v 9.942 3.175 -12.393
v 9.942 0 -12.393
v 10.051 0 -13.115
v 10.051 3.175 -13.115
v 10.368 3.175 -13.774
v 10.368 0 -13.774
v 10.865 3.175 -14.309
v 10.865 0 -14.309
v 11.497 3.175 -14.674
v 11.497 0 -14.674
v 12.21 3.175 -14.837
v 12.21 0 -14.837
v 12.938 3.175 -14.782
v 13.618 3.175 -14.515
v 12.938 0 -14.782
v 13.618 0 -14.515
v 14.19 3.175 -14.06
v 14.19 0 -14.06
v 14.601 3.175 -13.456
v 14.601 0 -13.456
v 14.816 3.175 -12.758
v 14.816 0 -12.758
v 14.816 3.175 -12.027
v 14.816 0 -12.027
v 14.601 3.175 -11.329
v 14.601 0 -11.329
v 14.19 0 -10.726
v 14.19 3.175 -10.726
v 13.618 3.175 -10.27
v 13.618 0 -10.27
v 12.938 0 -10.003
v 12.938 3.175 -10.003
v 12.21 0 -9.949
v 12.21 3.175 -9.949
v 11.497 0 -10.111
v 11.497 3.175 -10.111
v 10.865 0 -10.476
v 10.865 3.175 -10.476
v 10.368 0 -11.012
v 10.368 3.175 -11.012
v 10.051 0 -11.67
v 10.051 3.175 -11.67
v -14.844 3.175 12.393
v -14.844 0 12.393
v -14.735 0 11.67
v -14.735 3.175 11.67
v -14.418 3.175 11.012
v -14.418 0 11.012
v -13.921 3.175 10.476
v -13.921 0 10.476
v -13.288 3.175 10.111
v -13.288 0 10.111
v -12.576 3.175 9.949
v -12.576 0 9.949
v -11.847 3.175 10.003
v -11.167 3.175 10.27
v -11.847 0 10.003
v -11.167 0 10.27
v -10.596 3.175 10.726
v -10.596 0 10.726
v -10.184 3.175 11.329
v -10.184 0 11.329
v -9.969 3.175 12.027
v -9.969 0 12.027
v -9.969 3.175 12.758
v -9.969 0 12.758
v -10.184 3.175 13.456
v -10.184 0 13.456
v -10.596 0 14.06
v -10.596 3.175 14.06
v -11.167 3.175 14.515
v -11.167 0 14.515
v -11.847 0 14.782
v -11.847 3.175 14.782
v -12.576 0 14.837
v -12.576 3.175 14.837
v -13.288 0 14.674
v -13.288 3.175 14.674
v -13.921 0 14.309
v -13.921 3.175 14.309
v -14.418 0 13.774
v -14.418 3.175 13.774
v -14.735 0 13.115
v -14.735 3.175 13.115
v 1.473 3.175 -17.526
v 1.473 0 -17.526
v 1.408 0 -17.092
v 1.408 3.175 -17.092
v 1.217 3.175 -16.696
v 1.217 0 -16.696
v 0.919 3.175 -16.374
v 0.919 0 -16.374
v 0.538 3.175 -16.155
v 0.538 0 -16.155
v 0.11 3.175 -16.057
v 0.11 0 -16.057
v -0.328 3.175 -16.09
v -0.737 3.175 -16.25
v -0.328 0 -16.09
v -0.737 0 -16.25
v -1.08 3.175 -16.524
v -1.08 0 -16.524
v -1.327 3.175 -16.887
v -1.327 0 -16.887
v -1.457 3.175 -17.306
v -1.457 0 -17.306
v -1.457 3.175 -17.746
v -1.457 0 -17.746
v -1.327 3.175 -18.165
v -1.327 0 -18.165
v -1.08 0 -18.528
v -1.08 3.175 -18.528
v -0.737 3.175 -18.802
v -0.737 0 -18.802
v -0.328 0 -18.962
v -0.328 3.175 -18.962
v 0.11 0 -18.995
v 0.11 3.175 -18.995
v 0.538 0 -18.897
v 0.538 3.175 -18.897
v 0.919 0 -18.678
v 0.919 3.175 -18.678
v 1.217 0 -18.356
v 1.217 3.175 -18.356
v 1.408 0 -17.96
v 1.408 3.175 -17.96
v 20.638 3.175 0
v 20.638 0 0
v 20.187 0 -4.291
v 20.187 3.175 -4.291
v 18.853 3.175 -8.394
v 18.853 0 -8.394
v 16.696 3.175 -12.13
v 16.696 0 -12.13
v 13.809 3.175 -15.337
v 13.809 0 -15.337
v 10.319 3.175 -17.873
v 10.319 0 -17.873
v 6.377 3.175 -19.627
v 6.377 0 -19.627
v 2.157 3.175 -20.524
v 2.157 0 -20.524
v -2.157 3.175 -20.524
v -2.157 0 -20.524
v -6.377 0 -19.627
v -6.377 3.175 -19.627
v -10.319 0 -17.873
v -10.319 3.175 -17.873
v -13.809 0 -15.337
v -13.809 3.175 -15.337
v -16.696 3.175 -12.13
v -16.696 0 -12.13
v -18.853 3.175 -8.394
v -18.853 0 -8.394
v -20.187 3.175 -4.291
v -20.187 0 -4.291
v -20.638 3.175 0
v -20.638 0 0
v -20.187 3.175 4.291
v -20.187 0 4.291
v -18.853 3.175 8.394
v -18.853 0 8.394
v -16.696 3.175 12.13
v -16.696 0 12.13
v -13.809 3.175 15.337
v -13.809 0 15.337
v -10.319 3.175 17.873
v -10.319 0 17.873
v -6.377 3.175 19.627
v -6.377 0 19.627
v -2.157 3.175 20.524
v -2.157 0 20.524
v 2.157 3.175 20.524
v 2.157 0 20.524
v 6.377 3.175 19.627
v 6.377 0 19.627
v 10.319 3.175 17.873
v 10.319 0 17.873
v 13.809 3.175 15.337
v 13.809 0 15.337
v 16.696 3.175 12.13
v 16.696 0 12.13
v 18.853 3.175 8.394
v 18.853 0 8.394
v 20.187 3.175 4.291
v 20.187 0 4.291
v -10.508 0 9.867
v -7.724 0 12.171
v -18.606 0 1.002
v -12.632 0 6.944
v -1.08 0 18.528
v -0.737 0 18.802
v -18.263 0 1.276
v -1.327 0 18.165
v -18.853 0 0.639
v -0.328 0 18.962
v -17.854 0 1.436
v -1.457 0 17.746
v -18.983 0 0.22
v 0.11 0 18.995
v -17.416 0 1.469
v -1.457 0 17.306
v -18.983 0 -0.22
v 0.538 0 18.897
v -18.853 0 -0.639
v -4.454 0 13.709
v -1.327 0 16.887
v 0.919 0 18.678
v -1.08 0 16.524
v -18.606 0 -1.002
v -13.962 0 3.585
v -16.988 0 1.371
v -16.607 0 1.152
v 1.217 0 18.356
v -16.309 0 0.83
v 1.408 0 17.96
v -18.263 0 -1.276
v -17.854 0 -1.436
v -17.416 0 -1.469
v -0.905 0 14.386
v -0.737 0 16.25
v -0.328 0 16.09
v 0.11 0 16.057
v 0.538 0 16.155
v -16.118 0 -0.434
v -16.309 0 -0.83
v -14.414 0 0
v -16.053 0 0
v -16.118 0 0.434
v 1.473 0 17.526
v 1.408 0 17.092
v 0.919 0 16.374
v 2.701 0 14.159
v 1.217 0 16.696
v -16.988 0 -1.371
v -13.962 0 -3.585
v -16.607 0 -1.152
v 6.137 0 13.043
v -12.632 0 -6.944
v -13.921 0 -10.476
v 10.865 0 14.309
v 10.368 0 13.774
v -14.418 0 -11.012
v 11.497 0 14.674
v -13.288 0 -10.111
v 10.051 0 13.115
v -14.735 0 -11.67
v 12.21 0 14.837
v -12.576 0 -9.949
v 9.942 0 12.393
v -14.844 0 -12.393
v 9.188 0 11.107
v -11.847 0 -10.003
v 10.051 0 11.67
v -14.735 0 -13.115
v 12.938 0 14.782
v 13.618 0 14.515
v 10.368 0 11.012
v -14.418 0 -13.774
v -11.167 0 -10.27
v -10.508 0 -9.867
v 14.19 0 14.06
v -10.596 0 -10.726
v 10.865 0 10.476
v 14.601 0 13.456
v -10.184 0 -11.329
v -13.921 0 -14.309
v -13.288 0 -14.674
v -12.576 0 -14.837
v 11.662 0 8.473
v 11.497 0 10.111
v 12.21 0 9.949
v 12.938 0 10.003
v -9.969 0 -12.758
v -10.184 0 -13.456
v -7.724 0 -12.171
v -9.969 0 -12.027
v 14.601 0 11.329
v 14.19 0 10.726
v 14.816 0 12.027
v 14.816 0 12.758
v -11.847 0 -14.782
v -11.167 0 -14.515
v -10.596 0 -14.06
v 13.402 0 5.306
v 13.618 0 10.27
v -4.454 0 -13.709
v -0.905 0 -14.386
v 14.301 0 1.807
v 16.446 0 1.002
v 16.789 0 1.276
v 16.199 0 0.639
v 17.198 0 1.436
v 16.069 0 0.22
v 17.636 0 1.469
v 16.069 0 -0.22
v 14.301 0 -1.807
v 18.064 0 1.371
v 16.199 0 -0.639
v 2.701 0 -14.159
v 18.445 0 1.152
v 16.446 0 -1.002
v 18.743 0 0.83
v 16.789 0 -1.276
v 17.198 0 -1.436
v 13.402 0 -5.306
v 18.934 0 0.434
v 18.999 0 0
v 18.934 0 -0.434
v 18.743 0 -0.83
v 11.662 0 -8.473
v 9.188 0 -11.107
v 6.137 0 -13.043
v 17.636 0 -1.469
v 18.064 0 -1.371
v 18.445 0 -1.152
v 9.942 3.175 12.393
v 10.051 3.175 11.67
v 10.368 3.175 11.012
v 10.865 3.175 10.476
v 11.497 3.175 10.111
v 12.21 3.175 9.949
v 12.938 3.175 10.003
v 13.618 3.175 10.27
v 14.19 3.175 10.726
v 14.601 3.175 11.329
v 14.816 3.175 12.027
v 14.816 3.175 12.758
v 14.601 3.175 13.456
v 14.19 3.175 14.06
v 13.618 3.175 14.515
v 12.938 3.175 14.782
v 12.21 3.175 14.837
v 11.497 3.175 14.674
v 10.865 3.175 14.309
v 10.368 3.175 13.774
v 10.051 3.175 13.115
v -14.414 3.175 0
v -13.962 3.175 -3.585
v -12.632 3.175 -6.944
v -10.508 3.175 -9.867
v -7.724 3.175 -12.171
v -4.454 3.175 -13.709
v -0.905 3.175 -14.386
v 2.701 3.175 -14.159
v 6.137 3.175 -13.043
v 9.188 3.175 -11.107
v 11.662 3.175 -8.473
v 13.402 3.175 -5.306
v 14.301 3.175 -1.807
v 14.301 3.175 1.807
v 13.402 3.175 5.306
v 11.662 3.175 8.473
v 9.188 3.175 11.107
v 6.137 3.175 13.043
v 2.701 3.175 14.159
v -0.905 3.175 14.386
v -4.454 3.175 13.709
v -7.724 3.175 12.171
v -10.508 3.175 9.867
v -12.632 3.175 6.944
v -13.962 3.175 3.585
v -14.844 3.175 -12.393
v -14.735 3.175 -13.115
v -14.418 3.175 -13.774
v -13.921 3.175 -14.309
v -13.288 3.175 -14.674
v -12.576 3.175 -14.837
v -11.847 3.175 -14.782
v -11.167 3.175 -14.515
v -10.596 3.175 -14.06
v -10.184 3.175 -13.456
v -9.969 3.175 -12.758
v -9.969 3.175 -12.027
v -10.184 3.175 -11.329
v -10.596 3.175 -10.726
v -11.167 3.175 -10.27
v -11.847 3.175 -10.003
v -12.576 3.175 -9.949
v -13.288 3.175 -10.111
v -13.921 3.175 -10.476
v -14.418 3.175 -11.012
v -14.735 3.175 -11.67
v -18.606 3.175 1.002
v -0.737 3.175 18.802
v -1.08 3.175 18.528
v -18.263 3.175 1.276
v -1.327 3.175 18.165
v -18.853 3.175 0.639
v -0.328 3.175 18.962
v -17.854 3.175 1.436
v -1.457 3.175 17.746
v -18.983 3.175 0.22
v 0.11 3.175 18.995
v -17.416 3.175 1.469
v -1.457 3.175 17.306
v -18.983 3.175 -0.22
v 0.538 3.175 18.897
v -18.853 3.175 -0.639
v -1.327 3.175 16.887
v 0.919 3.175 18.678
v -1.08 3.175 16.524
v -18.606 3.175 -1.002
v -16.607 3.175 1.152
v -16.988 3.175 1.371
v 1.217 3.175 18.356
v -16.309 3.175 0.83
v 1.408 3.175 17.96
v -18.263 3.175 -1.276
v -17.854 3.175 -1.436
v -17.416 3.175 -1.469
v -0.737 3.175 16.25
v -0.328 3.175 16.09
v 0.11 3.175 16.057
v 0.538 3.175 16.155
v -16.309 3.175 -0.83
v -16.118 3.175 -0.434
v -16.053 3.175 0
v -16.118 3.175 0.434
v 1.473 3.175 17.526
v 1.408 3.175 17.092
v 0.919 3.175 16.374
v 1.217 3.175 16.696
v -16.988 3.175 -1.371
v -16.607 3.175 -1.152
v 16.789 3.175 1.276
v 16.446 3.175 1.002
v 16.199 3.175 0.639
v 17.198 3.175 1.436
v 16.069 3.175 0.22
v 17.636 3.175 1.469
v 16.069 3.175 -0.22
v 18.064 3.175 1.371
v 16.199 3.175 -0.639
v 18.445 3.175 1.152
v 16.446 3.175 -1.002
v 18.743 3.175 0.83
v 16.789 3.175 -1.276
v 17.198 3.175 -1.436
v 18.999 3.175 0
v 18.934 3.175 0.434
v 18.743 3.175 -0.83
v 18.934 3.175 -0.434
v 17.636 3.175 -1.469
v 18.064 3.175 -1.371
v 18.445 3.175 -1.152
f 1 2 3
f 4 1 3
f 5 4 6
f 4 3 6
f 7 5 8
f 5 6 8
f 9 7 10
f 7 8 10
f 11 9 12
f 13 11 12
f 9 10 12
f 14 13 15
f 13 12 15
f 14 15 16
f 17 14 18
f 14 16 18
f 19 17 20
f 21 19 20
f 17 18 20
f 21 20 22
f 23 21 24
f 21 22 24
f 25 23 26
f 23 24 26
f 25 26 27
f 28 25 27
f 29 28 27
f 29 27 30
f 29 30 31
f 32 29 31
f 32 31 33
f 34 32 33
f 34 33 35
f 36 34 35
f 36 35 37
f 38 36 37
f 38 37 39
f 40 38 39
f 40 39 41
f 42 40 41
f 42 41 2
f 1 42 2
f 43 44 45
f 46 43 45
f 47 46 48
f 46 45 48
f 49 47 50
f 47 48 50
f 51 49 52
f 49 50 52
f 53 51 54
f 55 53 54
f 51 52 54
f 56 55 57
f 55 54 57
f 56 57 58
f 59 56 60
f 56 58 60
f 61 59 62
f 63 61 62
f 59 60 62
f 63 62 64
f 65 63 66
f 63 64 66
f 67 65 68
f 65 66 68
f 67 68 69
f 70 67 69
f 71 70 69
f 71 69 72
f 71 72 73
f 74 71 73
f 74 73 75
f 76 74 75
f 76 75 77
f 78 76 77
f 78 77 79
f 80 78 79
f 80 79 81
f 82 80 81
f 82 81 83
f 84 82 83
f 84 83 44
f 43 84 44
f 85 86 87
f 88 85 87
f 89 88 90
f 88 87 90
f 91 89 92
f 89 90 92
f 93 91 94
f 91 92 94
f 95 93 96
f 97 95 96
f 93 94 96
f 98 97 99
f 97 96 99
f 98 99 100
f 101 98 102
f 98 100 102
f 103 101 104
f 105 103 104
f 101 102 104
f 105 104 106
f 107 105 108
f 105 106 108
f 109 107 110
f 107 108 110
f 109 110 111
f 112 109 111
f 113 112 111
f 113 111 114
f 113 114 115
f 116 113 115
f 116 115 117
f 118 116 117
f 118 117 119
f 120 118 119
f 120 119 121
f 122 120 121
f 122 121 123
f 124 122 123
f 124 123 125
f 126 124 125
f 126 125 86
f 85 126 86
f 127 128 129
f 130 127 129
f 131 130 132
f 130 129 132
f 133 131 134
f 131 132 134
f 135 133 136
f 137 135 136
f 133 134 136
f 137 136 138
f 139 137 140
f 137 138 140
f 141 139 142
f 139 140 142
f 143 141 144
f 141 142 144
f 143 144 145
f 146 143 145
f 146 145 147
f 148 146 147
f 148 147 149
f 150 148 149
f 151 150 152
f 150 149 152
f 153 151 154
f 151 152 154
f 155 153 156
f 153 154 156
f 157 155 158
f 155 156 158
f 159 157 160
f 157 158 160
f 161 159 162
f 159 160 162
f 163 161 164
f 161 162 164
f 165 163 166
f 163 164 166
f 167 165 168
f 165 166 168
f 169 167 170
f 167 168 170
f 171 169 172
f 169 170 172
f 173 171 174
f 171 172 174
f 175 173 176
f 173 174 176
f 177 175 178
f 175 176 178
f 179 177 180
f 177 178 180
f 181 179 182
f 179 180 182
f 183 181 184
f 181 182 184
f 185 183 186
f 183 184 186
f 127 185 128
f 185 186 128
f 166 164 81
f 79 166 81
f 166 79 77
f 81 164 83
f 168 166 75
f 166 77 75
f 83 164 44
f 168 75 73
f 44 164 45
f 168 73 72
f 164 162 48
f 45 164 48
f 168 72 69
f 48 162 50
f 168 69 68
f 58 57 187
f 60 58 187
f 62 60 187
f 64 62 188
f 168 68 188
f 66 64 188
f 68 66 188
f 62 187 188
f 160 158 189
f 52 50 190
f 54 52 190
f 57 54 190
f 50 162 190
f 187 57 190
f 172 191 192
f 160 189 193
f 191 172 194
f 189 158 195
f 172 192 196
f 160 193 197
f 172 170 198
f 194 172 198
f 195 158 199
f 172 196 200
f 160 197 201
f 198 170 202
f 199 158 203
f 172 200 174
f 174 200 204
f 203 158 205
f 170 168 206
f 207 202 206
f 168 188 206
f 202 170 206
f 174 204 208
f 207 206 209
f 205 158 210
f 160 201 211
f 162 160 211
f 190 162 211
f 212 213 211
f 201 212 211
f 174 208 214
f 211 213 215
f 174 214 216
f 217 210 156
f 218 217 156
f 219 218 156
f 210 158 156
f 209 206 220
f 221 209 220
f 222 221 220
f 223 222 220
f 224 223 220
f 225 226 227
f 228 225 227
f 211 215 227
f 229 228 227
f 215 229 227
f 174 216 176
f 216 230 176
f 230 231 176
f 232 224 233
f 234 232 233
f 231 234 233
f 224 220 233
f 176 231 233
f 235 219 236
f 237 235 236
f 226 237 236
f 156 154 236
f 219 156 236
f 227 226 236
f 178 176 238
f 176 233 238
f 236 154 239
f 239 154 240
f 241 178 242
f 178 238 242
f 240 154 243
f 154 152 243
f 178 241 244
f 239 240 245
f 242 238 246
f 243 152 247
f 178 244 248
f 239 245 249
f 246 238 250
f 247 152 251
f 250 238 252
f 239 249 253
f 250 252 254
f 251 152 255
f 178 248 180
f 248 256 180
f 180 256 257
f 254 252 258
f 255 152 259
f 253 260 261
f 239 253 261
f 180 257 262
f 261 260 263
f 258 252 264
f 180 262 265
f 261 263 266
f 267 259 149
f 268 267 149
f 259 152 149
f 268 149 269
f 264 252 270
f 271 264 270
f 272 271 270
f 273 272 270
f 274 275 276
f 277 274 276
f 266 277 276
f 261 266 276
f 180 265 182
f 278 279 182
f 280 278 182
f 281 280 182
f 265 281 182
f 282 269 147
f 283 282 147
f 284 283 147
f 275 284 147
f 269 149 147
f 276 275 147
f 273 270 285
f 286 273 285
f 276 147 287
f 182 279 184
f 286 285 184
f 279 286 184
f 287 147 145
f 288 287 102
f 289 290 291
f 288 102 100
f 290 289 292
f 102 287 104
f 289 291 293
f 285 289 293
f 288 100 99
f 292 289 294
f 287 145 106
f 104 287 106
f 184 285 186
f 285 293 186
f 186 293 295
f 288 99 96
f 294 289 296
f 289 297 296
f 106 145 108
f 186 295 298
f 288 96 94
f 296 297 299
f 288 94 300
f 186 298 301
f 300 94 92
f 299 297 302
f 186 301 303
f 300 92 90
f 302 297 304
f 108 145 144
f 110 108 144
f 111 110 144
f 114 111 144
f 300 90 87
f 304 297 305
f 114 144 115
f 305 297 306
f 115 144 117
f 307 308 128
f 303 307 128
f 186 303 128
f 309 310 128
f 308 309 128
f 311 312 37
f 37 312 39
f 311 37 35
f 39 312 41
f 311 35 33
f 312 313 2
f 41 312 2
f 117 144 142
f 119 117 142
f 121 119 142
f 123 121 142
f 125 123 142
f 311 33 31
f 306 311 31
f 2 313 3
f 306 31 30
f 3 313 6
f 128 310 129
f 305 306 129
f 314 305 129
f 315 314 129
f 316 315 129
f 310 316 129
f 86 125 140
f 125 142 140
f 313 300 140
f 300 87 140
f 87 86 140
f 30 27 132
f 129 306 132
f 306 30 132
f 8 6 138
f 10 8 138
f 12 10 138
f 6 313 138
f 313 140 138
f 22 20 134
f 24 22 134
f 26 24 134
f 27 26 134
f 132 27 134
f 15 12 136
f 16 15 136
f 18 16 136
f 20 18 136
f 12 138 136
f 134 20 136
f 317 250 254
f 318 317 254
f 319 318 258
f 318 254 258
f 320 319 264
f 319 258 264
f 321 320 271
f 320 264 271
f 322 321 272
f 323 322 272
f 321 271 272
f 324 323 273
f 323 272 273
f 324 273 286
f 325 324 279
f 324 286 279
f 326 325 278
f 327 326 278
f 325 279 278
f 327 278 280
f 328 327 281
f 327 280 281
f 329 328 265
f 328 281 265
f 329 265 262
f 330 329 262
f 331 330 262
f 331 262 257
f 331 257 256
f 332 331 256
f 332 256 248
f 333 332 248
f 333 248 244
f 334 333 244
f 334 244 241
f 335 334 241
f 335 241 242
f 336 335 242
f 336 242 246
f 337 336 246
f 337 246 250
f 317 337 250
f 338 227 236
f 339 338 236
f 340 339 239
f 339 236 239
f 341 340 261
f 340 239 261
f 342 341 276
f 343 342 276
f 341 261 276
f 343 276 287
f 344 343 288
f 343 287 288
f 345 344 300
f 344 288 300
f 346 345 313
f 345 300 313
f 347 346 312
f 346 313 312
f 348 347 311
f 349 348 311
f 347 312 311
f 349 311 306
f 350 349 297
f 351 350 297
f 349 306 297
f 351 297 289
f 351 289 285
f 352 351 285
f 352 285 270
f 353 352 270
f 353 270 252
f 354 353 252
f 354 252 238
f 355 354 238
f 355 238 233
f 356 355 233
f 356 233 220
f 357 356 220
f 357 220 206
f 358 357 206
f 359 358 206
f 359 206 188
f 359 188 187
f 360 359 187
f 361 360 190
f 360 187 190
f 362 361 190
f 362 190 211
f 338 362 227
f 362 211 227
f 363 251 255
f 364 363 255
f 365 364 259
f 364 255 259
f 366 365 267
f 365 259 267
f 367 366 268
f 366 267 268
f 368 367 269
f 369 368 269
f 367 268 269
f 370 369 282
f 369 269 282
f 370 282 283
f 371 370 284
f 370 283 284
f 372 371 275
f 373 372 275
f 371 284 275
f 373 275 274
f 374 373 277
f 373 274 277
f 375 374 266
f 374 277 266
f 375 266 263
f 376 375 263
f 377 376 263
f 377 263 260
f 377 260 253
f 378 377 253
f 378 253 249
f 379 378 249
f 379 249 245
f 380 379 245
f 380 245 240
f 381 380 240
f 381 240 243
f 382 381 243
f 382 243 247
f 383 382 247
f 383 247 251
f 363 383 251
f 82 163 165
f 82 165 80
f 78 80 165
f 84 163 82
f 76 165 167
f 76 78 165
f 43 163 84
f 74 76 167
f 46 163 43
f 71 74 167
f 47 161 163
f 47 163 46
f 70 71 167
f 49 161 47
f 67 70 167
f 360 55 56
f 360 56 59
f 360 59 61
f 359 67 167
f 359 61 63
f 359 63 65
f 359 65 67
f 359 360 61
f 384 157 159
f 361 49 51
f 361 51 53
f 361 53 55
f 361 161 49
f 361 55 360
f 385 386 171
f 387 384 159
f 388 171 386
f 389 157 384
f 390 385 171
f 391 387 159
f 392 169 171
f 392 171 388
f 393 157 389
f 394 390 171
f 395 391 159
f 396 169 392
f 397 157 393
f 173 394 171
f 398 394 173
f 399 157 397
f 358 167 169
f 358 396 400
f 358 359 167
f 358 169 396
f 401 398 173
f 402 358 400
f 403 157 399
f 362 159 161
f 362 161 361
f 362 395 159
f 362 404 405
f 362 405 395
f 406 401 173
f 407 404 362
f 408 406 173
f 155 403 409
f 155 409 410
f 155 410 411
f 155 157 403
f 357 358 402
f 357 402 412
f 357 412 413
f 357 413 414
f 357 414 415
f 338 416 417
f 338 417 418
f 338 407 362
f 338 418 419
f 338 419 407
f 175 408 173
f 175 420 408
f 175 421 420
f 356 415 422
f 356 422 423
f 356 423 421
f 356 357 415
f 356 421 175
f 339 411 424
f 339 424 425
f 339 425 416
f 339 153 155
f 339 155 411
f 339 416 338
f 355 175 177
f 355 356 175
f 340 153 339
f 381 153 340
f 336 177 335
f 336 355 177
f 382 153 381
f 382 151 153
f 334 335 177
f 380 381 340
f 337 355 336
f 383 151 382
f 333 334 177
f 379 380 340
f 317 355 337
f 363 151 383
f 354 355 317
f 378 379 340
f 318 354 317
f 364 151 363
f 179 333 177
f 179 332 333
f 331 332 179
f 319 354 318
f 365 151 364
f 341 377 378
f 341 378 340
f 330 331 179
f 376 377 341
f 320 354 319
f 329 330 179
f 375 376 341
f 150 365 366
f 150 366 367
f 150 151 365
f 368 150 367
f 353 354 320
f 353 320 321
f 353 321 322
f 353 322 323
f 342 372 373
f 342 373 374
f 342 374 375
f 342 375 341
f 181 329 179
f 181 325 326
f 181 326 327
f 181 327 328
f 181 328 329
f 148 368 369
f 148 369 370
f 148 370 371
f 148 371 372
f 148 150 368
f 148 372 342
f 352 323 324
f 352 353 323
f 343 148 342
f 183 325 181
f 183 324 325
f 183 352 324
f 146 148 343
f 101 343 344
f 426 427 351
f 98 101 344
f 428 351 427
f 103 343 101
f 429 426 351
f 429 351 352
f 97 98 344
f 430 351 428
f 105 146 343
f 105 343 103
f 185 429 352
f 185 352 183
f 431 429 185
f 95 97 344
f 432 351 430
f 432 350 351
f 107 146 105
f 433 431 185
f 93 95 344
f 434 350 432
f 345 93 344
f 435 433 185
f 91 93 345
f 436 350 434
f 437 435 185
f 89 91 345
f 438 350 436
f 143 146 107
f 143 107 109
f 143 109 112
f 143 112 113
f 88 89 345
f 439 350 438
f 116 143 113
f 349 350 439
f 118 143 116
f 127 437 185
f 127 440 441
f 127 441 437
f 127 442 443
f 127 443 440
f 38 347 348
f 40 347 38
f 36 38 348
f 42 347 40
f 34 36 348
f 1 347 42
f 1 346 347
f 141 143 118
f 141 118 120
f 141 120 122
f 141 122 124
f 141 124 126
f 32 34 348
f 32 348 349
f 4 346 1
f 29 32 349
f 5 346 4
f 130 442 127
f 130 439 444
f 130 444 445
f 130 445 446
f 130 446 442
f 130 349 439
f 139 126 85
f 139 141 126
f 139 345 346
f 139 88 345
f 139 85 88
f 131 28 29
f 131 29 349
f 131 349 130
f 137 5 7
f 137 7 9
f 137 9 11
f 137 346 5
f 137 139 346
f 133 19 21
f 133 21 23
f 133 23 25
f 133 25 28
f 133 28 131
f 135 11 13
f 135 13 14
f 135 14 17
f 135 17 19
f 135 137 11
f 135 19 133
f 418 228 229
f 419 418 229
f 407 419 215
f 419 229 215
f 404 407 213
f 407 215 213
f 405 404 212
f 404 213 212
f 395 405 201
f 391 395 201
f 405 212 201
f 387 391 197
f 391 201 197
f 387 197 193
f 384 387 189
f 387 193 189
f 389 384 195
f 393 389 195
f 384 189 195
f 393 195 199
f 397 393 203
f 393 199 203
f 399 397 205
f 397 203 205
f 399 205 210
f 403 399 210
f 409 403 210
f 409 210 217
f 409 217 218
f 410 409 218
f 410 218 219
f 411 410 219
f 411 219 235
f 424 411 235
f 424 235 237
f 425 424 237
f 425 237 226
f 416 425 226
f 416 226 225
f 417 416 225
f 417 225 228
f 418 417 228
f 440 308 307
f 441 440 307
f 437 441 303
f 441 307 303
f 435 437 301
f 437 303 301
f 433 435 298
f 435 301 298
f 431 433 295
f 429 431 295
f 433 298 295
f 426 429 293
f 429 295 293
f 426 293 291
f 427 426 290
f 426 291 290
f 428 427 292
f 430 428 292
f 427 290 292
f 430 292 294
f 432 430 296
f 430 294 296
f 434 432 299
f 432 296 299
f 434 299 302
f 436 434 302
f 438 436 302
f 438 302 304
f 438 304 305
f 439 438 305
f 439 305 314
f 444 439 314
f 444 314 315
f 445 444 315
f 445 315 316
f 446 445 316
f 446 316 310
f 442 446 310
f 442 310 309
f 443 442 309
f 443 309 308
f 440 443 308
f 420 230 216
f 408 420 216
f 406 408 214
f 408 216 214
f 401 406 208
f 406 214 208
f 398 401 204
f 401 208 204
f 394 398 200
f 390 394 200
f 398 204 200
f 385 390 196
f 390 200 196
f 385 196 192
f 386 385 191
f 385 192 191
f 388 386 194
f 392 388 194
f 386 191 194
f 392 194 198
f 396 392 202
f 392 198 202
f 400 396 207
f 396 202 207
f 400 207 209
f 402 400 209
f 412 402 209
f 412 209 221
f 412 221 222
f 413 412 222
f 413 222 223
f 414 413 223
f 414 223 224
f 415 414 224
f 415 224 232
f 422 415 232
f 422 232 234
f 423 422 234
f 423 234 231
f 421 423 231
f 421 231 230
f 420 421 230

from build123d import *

# Parameters (mm, degrees)
PROFILE_SKETCH_R              = 20.6375
PROFILE_EXTRUDE_DEPTH         = 3.175
BORE_SKETCH_R                 = 14.4145
BORE_CUT_DEPTH                = 4.175
BOLT_CLEARANCE_SKETCH_R       = 1.4732
BOLT_CLEARANCE_CUT_DEPTH      = 4.175
BOLT_HEAD_CLEARANCE_SKETCH_R  = 2.4511
BOLT_HEAD_CLEARANCE_CUT_DEPTH = 4.175


with BuildPart() as part:
    # Profile Sketch → Profile Extrude (new body)
    with BuildSketch(Plane(origin=(0, 0, 0), x_dir=(1, 0, 0), z_dir=(0, 1, 0))):
        Circle(PROFILE_SKETCH_R)
    extrude(amount=PROFILE_EXTRUDE_DEPTH)

    # Bore Sketch → Bore Cut (cut, through all)
    with BuildSketch(Plane(origin=(0, 0, 0), x_dir=(-1, 0, 0), z_dir=(0, -1, 0))):
        Circle(BORE_SKETCH_R)
    extrude(amount=-BORE_CUT_DEPTH, mode=Mode.SUBTRACT)

    # Bolt Clearance Sketch → Bolt Clearance Cut (cut, through all)
    with BuildSketch(Plane.XZ):
        with Locations((0, 17.526)):
            Circle(BOLT_CLEARANCE_SKETCH_R)
        with Locations((17.526, 0)):
            Circle(BOLT_CLEARANCE_SKETCH_R)
        with Locations((0, -17.526)):
            Circle(BOLT_CLEARANCE_SKETCH_R)
        with Locations((-17.526, 0)):
            Circle(BOLT_CLEARANCE_SKETCH_R)
    extrude(amount=-BOLT_CLEARANCE_CUT_DEPTH, mode=Mode.SUBTRACT)

    # Bolt Head Clearance Sketch → Bolt Head Clearance Cut (cut, through all)
    with BuildSketch(Plane(origin=(0, 0, 0), x_dir=(-1, 0, 0), z_dir=(0, -1, 0))):
        with Locations((-12.392753447, -12.392753447)):
            Circle(BOLT_HEAD_CLEARANCE_SKETCH_R)
        with Locations((-12.392753447, 12.392753447)):
            Circle(BOLT_HEAD_CLEARANCE_SKETCH_R)
        with Locations((12.392753447, 12.392753447)):
            Circle(BOLT_HEAD_CLEARANCE_SKETCH_R)
        with Locations((12.392753447, -12.392753447)):
            Circle(BOLT_HEAD_CLEARANCE_SKETCH_R)
    extrude(amount=-BOLT_HEAD_CLEARANCE_CUT_DEPTH, mode=Mode.SUBTRACT)


solid = part.part
